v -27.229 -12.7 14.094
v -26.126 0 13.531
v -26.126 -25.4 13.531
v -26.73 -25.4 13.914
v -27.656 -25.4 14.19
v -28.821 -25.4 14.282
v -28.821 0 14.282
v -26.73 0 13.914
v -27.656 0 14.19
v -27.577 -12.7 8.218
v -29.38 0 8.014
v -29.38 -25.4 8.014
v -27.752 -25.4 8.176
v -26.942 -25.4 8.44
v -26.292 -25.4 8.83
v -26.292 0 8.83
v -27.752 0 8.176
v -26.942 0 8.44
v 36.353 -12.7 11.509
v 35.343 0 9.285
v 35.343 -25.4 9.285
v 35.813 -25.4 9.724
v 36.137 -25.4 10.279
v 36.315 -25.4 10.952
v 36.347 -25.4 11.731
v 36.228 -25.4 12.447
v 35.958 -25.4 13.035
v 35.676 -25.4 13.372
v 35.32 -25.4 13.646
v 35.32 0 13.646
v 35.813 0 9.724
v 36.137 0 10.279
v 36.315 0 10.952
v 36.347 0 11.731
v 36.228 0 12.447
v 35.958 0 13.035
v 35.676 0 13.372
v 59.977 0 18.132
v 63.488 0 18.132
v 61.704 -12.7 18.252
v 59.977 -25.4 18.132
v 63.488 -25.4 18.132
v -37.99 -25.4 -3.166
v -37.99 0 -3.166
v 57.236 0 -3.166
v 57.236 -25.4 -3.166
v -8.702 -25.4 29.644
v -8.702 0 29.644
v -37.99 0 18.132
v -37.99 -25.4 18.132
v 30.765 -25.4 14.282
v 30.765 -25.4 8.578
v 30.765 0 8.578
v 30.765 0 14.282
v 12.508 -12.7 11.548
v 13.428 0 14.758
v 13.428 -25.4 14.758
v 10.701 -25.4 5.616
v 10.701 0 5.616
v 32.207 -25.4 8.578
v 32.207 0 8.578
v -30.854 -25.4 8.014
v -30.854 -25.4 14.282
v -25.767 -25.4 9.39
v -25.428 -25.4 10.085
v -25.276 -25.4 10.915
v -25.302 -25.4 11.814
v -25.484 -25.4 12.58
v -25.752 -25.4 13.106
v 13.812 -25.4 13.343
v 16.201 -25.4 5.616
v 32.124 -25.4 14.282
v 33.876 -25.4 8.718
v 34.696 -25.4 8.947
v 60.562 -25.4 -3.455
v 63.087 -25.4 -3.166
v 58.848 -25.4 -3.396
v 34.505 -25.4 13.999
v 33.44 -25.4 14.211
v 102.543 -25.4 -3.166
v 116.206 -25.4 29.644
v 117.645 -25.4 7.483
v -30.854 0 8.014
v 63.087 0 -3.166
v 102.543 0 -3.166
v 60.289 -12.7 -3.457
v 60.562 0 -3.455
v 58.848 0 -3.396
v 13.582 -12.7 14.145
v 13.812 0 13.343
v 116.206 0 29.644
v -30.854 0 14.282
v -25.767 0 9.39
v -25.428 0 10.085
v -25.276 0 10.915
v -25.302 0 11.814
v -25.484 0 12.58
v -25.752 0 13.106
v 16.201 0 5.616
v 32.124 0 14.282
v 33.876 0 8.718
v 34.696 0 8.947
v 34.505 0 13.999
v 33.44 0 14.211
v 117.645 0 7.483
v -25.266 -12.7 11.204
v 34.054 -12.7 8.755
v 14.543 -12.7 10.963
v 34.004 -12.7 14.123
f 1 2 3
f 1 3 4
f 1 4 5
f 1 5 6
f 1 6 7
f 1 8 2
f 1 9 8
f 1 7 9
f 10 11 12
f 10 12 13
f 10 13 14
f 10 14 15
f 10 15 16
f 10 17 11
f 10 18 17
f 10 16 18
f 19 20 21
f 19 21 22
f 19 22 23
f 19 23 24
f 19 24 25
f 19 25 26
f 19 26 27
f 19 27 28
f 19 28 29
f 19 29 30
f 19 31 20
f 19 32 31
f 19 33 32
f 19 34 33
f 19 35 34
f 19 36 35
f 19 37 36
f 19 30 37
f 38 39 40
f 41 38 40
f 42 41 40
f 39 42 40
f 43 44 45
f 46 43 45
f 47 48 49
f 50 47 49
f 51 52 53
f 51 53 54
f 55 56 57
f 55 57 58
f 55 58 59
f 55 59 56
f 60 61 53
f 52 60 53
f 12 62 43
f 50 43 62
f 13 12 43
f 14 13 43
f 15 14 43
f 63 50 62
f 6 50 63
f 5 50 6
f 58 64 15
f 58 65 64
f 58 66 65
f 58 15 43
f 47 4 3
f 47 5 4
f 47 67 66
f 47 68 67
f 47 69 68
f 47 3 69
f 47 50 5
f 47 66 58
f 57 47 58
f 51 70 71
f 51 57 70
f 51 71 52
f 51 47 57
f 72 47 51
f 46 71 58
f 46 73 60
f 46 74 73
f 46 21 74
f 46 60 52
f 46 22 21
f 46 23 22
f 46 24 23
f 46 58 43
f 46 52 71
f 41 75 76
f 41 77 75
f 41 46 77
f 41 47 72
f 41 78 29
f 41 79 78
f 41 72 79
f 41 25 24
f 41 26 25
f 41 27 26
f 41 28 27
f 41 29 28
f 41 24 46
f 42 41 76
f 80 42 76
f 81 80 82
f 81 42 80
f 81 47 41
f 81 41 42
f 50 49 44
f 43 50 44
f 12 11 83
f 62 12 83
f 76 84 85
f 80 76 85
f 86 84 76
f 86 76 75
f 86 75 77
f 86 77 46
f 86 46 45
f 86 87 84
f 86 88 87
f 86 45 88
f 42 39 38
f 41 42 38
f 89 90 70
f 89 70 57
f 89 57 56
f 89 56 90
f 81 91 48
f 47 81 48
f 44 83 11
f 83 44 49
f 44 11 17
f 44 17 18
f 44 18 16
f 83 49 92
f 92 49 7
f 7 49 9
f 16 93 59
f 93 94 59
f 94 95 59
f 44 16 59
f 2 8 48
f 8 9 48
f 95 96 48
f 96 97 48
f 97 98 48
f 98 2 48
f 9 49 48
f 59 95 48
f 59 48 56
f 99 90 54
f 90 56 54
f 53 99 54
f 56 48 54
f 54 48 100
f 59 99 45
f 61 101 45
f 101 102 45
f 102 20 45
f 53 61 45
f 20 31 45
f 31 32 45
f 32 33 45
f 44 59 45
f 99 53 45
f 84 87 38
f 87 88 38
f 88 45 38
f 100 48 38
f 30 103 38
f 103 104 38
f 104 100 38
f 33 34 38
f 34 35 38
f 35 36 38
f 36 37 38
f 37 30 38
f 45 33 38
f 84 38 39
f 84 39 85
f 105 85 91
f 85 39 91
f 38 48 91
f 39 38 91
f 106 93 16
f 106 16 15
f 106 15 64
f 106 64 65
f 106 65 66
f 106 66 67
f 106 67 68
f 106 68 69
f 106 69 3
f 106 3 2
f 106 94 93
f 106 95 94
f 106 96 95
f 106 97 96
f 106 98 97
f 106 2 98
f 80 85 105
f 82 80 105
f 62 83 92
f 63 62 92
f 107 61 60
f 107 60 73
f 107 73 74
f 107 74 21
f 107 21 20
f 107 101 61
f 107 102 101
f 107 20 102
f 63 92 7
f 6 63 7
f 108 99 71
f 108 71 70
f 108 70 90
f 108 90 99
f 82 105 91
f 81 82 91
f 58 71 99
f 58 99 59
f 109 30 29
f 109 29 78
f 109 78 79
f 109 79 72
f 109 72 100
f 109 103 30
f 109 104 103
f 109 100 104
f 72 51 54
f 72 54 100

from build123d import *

# Parameters (mm, degrees)
F0_W     = 8.3609821595
F0_H     = 9.1143487112
F0_W_2   = 4.4786023839
F0_H_2   = 21.1173728506
F1_DEPTH = 25.4


with BuildPart() as f1:
    # F0 (on Front) → F1 (new body)
    with BuildSketch(Plane.XZ):
        with BuildLine():
            Line((-19.2826222628, 18.131762743), (-37.9903614521, 18.131762743))
            Line((-37.9903614521, 18.131762743), (-37.9903614521, -3.1658634543))
            Line((-37.9903614521, -3.1658634543), (-35.3327800581, -3.1658634543))
            Line((-35.3327800581, -3.1658634543), (-35.3327800581, 17.9515093963))
            Line((-35.3327800581, 17.9515093963), (-28.5894561384, 17.9515093963))
            add(Edge.make_bspline(
                [(-28.5894561384, 17.9515093963), (-24.7440514084, 17.9515093963), (-22.745088012, 16.296876111)],
                knots=[0, 0, 0, 1, 1, 1], degree=2))
            add(Edge.make_bspline(
                [(-22.745088012, 16.296876111), (-20.7461246157, 14.6422428257), (-20.7461246157, 11.3653294199)],
                knots=[0, 0, 0, 1, 1, 1], degree=2))
            add(Edge.make_bspline(
                [(-20.7461246157, 11.3653294199), (-20.7461246157, 7.9543814742), (-22.8768116115, 6.1495370667)],
                knots=[0, 0, 0, 1, 1, 1], degree=2))
            add(Edge.make_bspline(
                [(-22.8768116115, 6.1495370667), (-25.0074986074, 4.3446926591), (-28.9360971898, 4.3446926591)],
                knots=[0, 0, 0, 1, 1, 1], degree=2))
            Line((-28.9360971898, 4.3446926591), (-30.8541776742, 4.3446926591))
            Line((-30.8541776742, 4.3446926591), (-30.8541776742, -3.1658634543))
            Line((-30.8541776742, -3.1658634543), (-19.2826222628, -3.1658634543))
            Line((-19.2826222628, -3.1658634543), (-19.2826222628, 18.131762743))
        make_face()
        with BuildLine():
            Line((-8.7019680068, 29.6439938247), (-37.9903614521, 18.131762743))
            Line((-37.9903614521, 18.131762743), (-19.2826222628, 18.131762743))
            Line((-19.2826222628, 18.131762743), (2.0150034688, 18.131762743))
            Line((2.0150034688, 18.131762743), (24.7516594827, 18.131762743))
            Line((24.7516594827, 18.131762743), (44.3224497139, 18.131762743))
            Line((44.3224497139, 18.131762743), (52.0932041109, 18.131762743))
            Line((52.0932041109, 18.131762743), (59.9767177003, 18.131762743))
            add(Edge.make_bspline(
                [(59.9767177003, 18.131762743), (60.7857124915, 18.2519316408), (61.7036049274, 18.2519316408)],
                knots=[0.7260728655, 0.7260728655, 0.7260728655, 1, 1, 1], degree=2))
            add(Edge.make_bspline(
                [(61.7036049274, 18.2519316408), (62.6190151517, 18.2519316408), (63.4879314572, 18.131762743)],
                knots=[0, 0, 0, 0.5563486403, 0.5563486403, 0.5563486403], degree=2))
            Line((63.4879314572, 18.131762743), (69.9371621013, 18.131762743))
            Line((69.9371621013, 18.131762743), (86.3420888782, 18.131762743))
            Line((86.3420888782, 18.131762743), (102.5425426617, 18.131762743))
            Line((102.5425426617, 18.131762743), (116.2057295442, 29.6439938247))
            Line((116.2057295442, 29.6439938247), (84.2592939734, 29.6439938247))
            Line((84.2592939734, 29.6439938247), (-8.7019680068, 29.6439938247))
        make_face()
        Polygon((2.0150034688, 18.131762743), (-19.2826222628, 18.131762743), (-19.2826222628, -3.1658634543), (-16.7574415844, -3.1658634543), (-16.7574415844, 17.9515093963), (-12.2788392004, 17.9515093963), (-12.2788392004, 9.6737210891), (-3.9178570409, 9.6737210891), (-3.9178570409, 17.9515093963), (0.546879701, 17.9515093963), (0.546879701, -3.1658634543), (2.0150034688, -3.1658634543), align=None)
        with BuildLine():
            Line((-35.3327800581, 17.9515093963), (-35.3327800581, -3.1658634543))
            Line((-35.3327800581, -3.1658634543), (-30.8541776742, -3.1658634543))
            Line((-30.8541776742, -3.1658634543), (-30.8541776742, 4.3446926591))
            Line((-30.8541776742, 4.3446926591), (-28.9360971898, 4.3446926591))
            add(Edge.make_bspline(
                [(-22.8768116115, 6.1495370667), (-25.0074986074, 4.3446926591), (-28.9360971898, 4.3446926591)],
                knots=[0, 0, 0, 1, 1, 1], degree=2))
            add(Edge.make_bspline(
                [(-20.7461246157, 11.3653294199), (-20.7461246157, 7.9543814742), (-22.8768116115, 6.1495370667)],
                knots=[0, 0, 0, 1, 1, 1], degree=2))
            add(Edge.make_bspline(
                [(-22.745088012, 16.296876111), (-20.7461246157, 14.6422428257), (-20.7461246157, 11.3653294199)],
                knots=[0, 0, 0, 1, 1, 1], degree=2))
            add(Edge.make_bspline(
                [(-28.5894561384, 17.9515093963), (-24.7440514084, 17.9515093963), (-22.745088012, 16.296876111)],
                knots=[0, 0, 0, 1, 1, 1], degree=2))
            Line((-28.5894561384, 17.9515093963), (-35.3327800581, 17.9515093963))
        make_face()
        with BuildLine():
            Line((-29.3797977356, 8.0144659231), (-30.8541776742, 8.0144659231))
            Line((-30.8541776742, 8.0144659231), (-30.8541776742, 14.2817361322))
            Line((-30.8541776742, 14.2817361322), (-28.8205501727, 14.2817361322))
            add(Edge.make_bspline(
                [(-26.1259937332, 13.5306805209), (-26.9856635407, 14.2817361322), (-28.8205501727, 14.2817361322)],
                knots=[0, 0, 0, 1, 1, 1], degree=2))
            add(Edge.make_bspline(
                [(-25.2663239258, 11.2035635959), (-25.2663239258, 12.7796249096), (-26.1259937332, 13.5306805209)],
                knots=[0, 0, 0, 1, 1, 1], degree=2))
            add(Edge.make_bspline(
                [(-26.2923814379, 8.8302278641), (-25.2663239258, 9.645989805), (-25.2663239258, 11.2035635959)],
                knots=[0, 0, 0, 1, 1, 1], degree=2))
            add(Edge.make_bspline(
                [(-29.3797977356, 8.0144659231), (-27.31843895, 8.0144659231), (-26.2923814379, 8.8302278641)],
                knots=[0, 0, 0, 1, 1, 1], degree=2))
        make_face(mode=Mode.SUBTRACT)
        Polygon((24.7516594827, 18.131762743), (2.0150034688, 18.131762743), (2.0150034688, -3.1658634543), (3.218326737, -3.1658634543), (10.6734202822, 18.0393251293), (16.1457270135, 18.0393251293), (23.6285518428, -3.1658634543), (24.7516594827, -3.1658634543), align=None)
        Polygon((117.6447570324, 7.4829496443), (116.2057295442, 29.6439938247), (102.5425426617, 18.131762743), (102.5425426617, -3.1658634543), align=None)
        with BuildLine():
            Line((44.3224497139, 18.131762743), (24.7516594827, 18.131762743))
            Line((24.7516594827, 18.131762743), (24.7516594827, -3.1658634543))
            Line((24.7516594827, -3.1658634543), (26.2861332368, -3.1658634543))
            Line((26.2861332368, -3.1658634543), (26.2861332368, 17.9515093963))
            Line((26.2861332368, 17.9515093963), (32.4378564288, 17.9515093963))
            add(Edge.make_bspline(
                [(32.4378564288, 17.9515093963), (36.7454492274, 17.9515093963), (38.8091189533, 16.384691844)],
                knots=[0, 0, 0, 1, 1, 1], degree=2))
            add(Edge.make_bspline(
                [(38.8091189533, 16.384691844), (40.8727886792, 14.8178742917), (40.8727886792, 11.6241547383)],
                knots=[0, 0, 0, 1, 1, 1], degree=2))
            add(Edge.make_bspline(
                [(40.8727886792, 11.6241547383), (40.8727886792, 9.7615368221), (39.8490421075, 8.310266287)],
                knots=[0, 0, 0, 1, 1, 1], degree=2))
            add(Edge.make_bspline(
                [(39.8490421075, 8.310266287), (38.8252955357, 6.8589957518), (36.9441900968, 6.0363009899)],
                knots=[0, 0, 0, 1, 1, 1], degree=2))
            add(Edge.make_bspline(
                [(36.9441900968, 6.0363009899), (41.7139709639, -1.086017146), (43.1559977377, -3.1658634543)],
                knots=[0, 0, 0, 1, 1, 1], degree=2))
            Line((43.1559977377, -3.1658634543), (44.3224497139, -3.1658634543))
            Line((44.3224497139, -3.1658634543), (44.3224497139, 18.131762743))
        make_face()
        Polygon((-16.7574415844, 17.9515093963), (-16.7574415844, -3.1658634543), (-12.2788392004, -3.1658634543), (-12.2788392004, 5.9484852568), (-3.9178570409, 5.9484852568), (-3.9178570409, -3.1658634543), (0.546879701, -3.1658634543), (0.546879701, 17.9515093963), (-3.9178570409, 17.9515093963), (-3.9178570409, 9.6737210891), (-12.2788392004, 9.6737210891), (-12.2788392004, 17.9515093963), align=None)
        Polygon((102.5425426617, -3.1658634543), (102.5425426617, 18.131762743), (86.3420888782, 18.131762743), (86.3420888782, -3.1658634543), (88.4642940946, -3.1658634543), (88.4642940946, 17.9515093963), (100.6244621773, 17.9515093963), (100.6244621773, 14.2817361322), (92.9428964785, 14.2817361322), (92.9428964785, 9.645989805), (100.0929458985, 9.645989805), (100.0929458985, 5.976216541), (92.9428964785, 5.976216541), (92.9428964785, 0.5316410938), (100.6244621773, 0.5316410938), (100.6244621773, -3.1658634543), align=None)
        Polygon((52.0932041109, 18.131762743), (44.3224497139, 18.131762743), (44.3224497139, -3.1658634543), (45.8135791317, -3.1658634543), (45.8135791317, 17.9515093963), (50.2921815156, 17.9515093963), (50.2921815156, -3.1658634543), (52.0932041109, -3.1658634543), align=None)
        Polygon((10.6734202822, 18.0393251293), (3.218326737, -3.1658634543), (8.0435701724, -3.1658634543), (9.5734126791, 1.8627427311), (17.2734659007, 1.8627427311), (18.8033084075, -3.1658634543), (23.6285518428, -3.1658634543), (16.1457270135, 18.0393251293), align=None)
        with BuildLine():
            add(Edge.make_bspline(
                [(16.2011895817, 5.6157098475), (14.0797463472, 12.4468495002), (13.8116772675, 13.3434943531)],
                knots=[0, 0, 0, 1, 1, 1], degree=2))
            Line((16.2011895817, 5.6157098475), (10.7011515663, 5.6157098475))
            add(Edge.make_bspline(
                [(13.4280611706, 14.7577898428), (12.95200746, 12.9090375687), (10.7011515663, 5.6157098475)],
                knots=[0, 0, 0, 1, 1, 1], degree=2))
            add(Edge.make_bspline(
                [(13.8116772675, 13.3434943531), (13.5436081877, 14.2401392061), (13.4280611706, 14.7577898428)],
                knots=[0, 0, 0, 1, 1, 1], degree=2))
        make_face(mode=Mode.SUBTRACT)
        with Locations((-8.0983481207, 1.3913109013)):
            Rectangle(F0_W, F0_H)
        Polygon((86.3420888782, -3.1658634543), (86.3420888782, 18.131762743), (69.9371621013, 18.131762743), (69.9371621013, -3.1658634543), (71.8994737189, -3.1658634543), (71.8994737189, 17.9515093963), (84.0596418016, 17.9515093963), (84.0596418016, 14.2817361322), (76.3780761028, 14.2817361322), (76.3780761028, 9.645989805), (83.5281255228, 9.645989805), (83.5281255228, 5.976216541), (76.3780761028, 5.976216541), (76.3780761028, 0.5316410938), (84.0596418016, 0.5316410938), (84.0596418016, -3.1658634543), align=None)
        with BuildLine():
            Line((59.9767177003, 18.131762743), (52.0932041109, 18.131762743))
            Line((52.0932041109, 18.131762743), (52.0932041109, -3.1658634543))
            Line((52.0932041109, -3.1658634543), (57.2358830465, -3.1658634543))
            add(Edge.make_bspline(
                [(57.2358830465, -3.1658634543), (55.6650956404, -2.8475842694), (54.3085958311, -2.1814028684)],
                knots=[0.477766543, 0.477766543, 0.477766543, 1, 1, 1], degree=2))
            Line((54.3085958311, -2.1814028684), (54.3085958311, 1.9782897483))
            add(Edge.make_bspline(
                [(54.3085958311, 1.9782897483), (56.4439047076, 1.0215604464), (57.9252174672, 0.6333224689)],
                knots=[0, 0, 0, 1, 1, 1], degree=2))
            add(Edge.make_bspline(
                [(57.9252174672, 0.6333224689), (59.4065302268, 0.2450844913), (60.6359504891, 0.2450844913)],
                knots=[0, 0, 0, 1, 1, 1], degree=2))
            add(Edge.make_bspline(
                [(60.6359504891, 0.2450844913), (62.105708547, 0.2450844913), (62.8937392038, 0.8066429946)],
                knots=[0, 0, 0, 1, 1, 1], degree=2))
            add(Edge.make_bspline(
                [(62.8937392038, 0.8066429946), (63.6817698606, 1.3682014978), (63.6817698606, 2.482074743)],
                knots=[0, 0, 0, 1, 1, 1], degree=2))
            add(Edge.make_bspline(
                [(63.6817698606, 2.482074743), (63.6817698606, 3.1014067548), (63.3351288092, 3.5867042267)],
                knots=[0, 0, 0, 1, 1, 1], degree=2))
            add(Edge.make_bspline(
                [(63.3351288092, 3.5867042267), (62.9884877578, 4.0720016987), (62.3160041182, 4.5180131848)],
                knots=[0, 0, 0, 1, 1, 1], degree=2))
            add(Edge.make_bspline(
                [(62.3160041182, 4.5180131848), (61.6435204785, 4.9640246709), (59.5775398122, 5.9484852568)],
                knots=[0, 0, 0, 1, 1, 1], degree=2))
            add(Edge.make_bspline(
                [(59.5775398122, 5.9484852568), (57.6455936858, 6.8589957518), (56.6773096822, 7.6955561558)],
                knots=[0, 0, 0, 1, 1, 1], degree=2))
            add(Edge.make_bspline(
                [(56.6773096822, 7.6955561558), (55.7090256787, 8.5321165599), (55.131290593, 9.645989805)],
                knots=[0, 0, 0, 1, 1, 1], degree=2))
            add(Edge.make_bspline(
                [(55.131290593, 9.645989805), (54.5535555074, 10.7598630501), (54.5535555074, 12.2434867501)],
                knots=[0, 0, 0, 1, 1, 1], degree=2))
            add(Edge.make_bspline(
                [(54.5535555074, 12.2434867501), (54.5535555074, 15.048968326), (56.453148469, 16.6504499834)],
                knots=[0, 0, 0, 1, 1, 1], degree=2))
            add(Edge.make_bspline(
                [(56.453148469, 16.6504499834), (57.8323913738, 17.8132423594), (59.9767177003, 18.131762743)],
                knots=[0, 0, 0, 0.7260728655, 0.7260728655, 0.7260728655], degree=2))
        make_face()
        with BuildLine():
            Line((26.2861332368, 17.9515093963), (26.2861332368, -3.1658634543))
            Line((26.2861332368, -3.1658634543), (30.7647356207, -3.1658634543))
            Line((30.7647356207, -3.1658634543), (30.7647356207, 4.9362933868))
            Line((30.7647356207, 4.9362933868), (33.1450041736, 4.9362933868))
            Line((33.1450041736, 4.9362933868), (38.1874760011, -3.1658634543))
            Line((38.1874760011, -3.1658634543), (43.1559977377, -3.1658634543))
            add(Edge.make_bspline(
                [(36.9441900968, 6.0363009899), (41.7139709639, -1.086017146), (43.1559977377, -3.1658634543)],
                knots=[0, 0, 0, 1, 1, 1], degree=2))
            add(Edge.make_bspline(
                [(39.8490421075, 8.310266287), (38.8252955357, 6.8589957518), (36.9441900968, 6.0363009899)],
                knots=[0, 0, 0, 1, 1, 1], degree=2))
            add(Edge.make_bspline(
                [(40.8727886792, 11.6241547383), (40.8727886792, 9.7615368221), (39.8490421075, 8.310266287)],
                knots=[0, 0, 0, 1, 1, 1], degree=2))
            add(Edge.make_bspline(
                [(38.8091189533, 16.384691844), (40.8727886792, 14.8178742917), (40.8727886792, 11.6241547383)],
                knots=[0, 0, 0, 1, 1, 1], degree=2))
            add(Edge.make_bspline(
                [(32.4378564288, 17.9515093963), (36.7454492274, 17.9515093963), (38.8091189533, 16.384691844)],
                knots=[0, 0, 0, 1, 1, 1], degree=2))
            Line((32.4378564288, 17.9515093963), (26.2861332368, 17.9515093963))
        make_face()
        with BuildLine():
            Line((32.2067623945, 8.5783353667), (30.7647356207, 8.5783353667))
            Line((30.7647356207, 8.5783353667), (30.7647356207, 14.2817361322))
            Line((30.7647356207, 14.2817361322), (32.1235685422, 14.2817361322))
            add(Edge.make_bspline(
                [(35.319599036, 13.646227538), (34.2866087028, 14.2817361322), (32.1235685422, 14.2817361322)],
                knots=[0, 0, 0, 1, 1, 1], degree=2))
            add(Edge.make_bspline(
                [(36.3525893691, 11.5086077211), (36.3525893691, 13.0107189438), (35.319599036, 13.646227538)],
                knots=[0, 0, 0, 1, 1, 1], degree=2))
            add(Edge.make_bspline(
                [(35.3427084394, 9.2854831115), (36.3525893691, 9.9926308564), (36.3525893691, 11.5086077211)],
                knots=[0, 0, 0, 1, 1, 1], degree=2))
            add(Edge.make_bspline(
                [(32.2067623945, 8.5783353667), (34.3328275097, 8.5783353667), (35.3427084394, 9.2854831115)],
                knots=[0, 0, 0, 1, 1, 1], degree=2))
        make_face(mode=Mode.SUBTRACT)
        Polygon((9.5734126791, 1.8627427311), (8.0435701724, -3.1658634543), (18.8033084075, -3.1658634543), (17.2734659007, 1.8627427311), align=None)
        Polygon((88.4642940946, -3.1658634543), (100.6244621773, -3.1658634543), (100.6244621773, 0.5316410938), (92.9428964785, 0.5316410938), (92.9428964785, 5.976216541), (100.0929458985, 5.976216541), (100.0929458985, 9.645989805), (92.9428964785, 9.645989805), (92.9428964785, 14.2817361322), (100.6244621773, 14.2817361322), (100.6244621773, 17.9515093963), (88.4642940946, 17.9515093963), align=None)
        with BuildLine():
            Line((69.9371621013, -3.1658634543), (69.9371621013, 18.131762743))
            Line((69.9371621013, 18.131762743), (63.4879314572, 18.131762743))
            add(Edge.make_bspline(
                [(63.4879314572, 18.131762743), (64.180834922, 18.0359359699), (64.8441728529, 17.8636936633)],
                knots=[0.5563486403, 0.5563486403, 0.5563486403, 1, 1, 1], degree=2))
            add(Edge.make_bspline(
                [(64.8441728529, 17.8636936633), (66.3393512546, 17.4754556857), (67.9708751365, 16.7683079409)],
                knots=[0, 0, 0, 1, 1, 1], degree=2))
            Line((67.9708751365, 16.7683079409), (66.5288483627, 13.2834099042))
            add(Edge.make_bspline(
                [(66.5288483627, 13.2834099042), (64.8372400319, 13.976692007), (63.7326105482, 14.2516939078)],
                knots=[0, 0, 0, 1, 1, 1], degree=2))
            add(Edge.make_bspline(
                [(63.7326105482, 14.2516939078), (62.6279810644, 14.5266958086), (61.5603266261, 14.5266958086)],
                knots=[0, 0, 0, 1, 1, 1], degree=2))
            add(Edge.make_bspline(
                [(61.5603266261, 14.5266958086), (60.2893094377, 14.5266958086), (59.609892977, 13.9350950808)],
                knots=[0, 0, 0, 1, 1, 1], degree=2))
            add(Edge.make_bspline(
                [(59.609892977, 13.9350950808), (58.9304765163, 13.3434943531), (58.9304765163, 12.391386932)],
                knots=[0, 0, 0, 1, 1, 1], degree=2))
            add(Edge.make_bspline(
                [(58.9304765163, 12.391386932), (58.9304765163, 11.7997862043), (59.205478417, 11.3583965989)],
                knots=[0, 0, 0, 1, 1, 1], degree=2))
            add(Edge.make_bspline(
                [(59.205478417, 11.3583965989), (59.4804803178, 10.9170069934), (60.0790138665, 10.5056596124)],
                knots=[0, 0, 0, 1, 1, 1], degree=2))
            add(Edge.make_bspline(
                [(60.0790138665, 10.5056596124), (60.6775474153, 10.0943122315), (62.9145376669, 9.0266577932)],
                knots=[0, 0, 0, 1, 1, 1], degree=2))
            add(Edge.make_bspline(
                [(62.9145376669, 9.0266577932), (65.8771631861, 7.6077404228), (66.9748598488, 6.1865121121)],
                knots=[0, 0, 0, 1, 1, 1], degree=2))
            add(Edge.make_bspline(
                [(66.9748598488, 6.1865121121), (68.0725565116, 4.7652838014), (68.0725565116, 2.6993031352)],
                knots=[0, 0, 0, 1, 1, 1], degree=2))
            add(Edge.make_bspline(
                [(68.0725565116, 2.6993031352), (68.0725565116, -0.161641009), (66.0135086663, -1.8093414732)],
                knots=[0, 0, 0, 1, 1, 1], degree=2))
            add(Edge.make_bspline(
                [(66.0135086663, -1.8093414732), (64.8200402885, -2.7643840697), (63.0869836467, -3.1658634543)],
                knots=[0, 0, 0, 0.5796214889, 0.5796214889, 0.5796214889], degree=2))
            Line((63.0869836467, -3.1658634543), (69.9371621013, -3.1658634543))
        make_face()
        with BuildLine():
            Line((63.4879314572, 18.131762743), (59.9767177003, 18.131762743))
            add(Edge.make_bspline(
                [(56.453148469, 16.6504499834), (57.8323913738, 17.8132423594), (59.9767177003, 18.131762743)],
                knots=[0, 0, 0, 0.7260728655, 0.7260728655, 0.7260728655], degree=2))
            add(Edge.make_bspline(
                [(54.5535555074, 12.2434867501), (54.5535555074, 15.048968326), (56.453148469, 16.6504499834)],
                knots=[0, 0, 0, 1, 1, 1], degree=2))
            add(Edge.make_bspline(
                [(55.131290593, 9.645989805), (54.5535555074, 10.7598630501), (54.5535555074, 12.2434867501)],
                knots=[0, 0, 0, 1, 1, 1], degree=2))
            add(Edge.make_bspline(
                [(56.6773096822, 7.6955561558), (55.7090256787, 8.5321165599), (55.131290593, 9.645989805)],
                knots=[0, 0, 0, 1, 1, 1], degree=2))
            add(Edge.make_bspline(
                [(59.5775398122, 5.9484852568), (57.6455936858, 6.8589957518), (56.6773096822, 7.6955561558)],
                knots=[0, 0, 0, 1, 1, 1], degree=2))
            add(Edge.make_bspline(
                [(62.3160041182, 4.5180131848), (61.6435204785, 4.9640246709), (59.5775398122, 5.9484852568)],
                knots=[0, 0, 0, 1, 1, 1], degree=2))
            add(Edge.make_bspline(
                [(63.3351288092, 3.5867042267), (62.9884877578, 4.0720016987), (62.3160041182, 4.5180131848)],
                knots=[0, 0, 0, 1, 1, 1], degree=2))
            add(Edge.make_bspline(
                [(63.6817698606, 2.482074743), (63.6817698606, 3.1014067548), (63.3351288092, 3.5867042267)],
                knots=[0, 0, 0, 1, 1, 1], degree=2))
            add(Edge.make_bspline(
                [(62.8937392038, 0.8066429946), (63.6817698606, 1.3682014978), (63.6817698606, 2.482074743)],
                knots=[0, 0, 0, 1, 1, 1], degree=2))
            add(Edge.make_bspline(
                [(60.6359504891, 0.2450844913), (62.105708547, 0.2450844913), (62.8937392038, 0.8066429946)],
                knots=[0, 0, 0, 1, 1, 1], degree=2))
            add(Edge.make_bspline(
                [(57.9252174672, 0.6333224689), (59.4065302268, 0.2450844913), (60.6359504891, 0.2450844913)],
                knots=[0, 0, 0, 1, 1, 1], degree=2))
            add(Edge.make_bspline(
                [(54.3085958311, 1.9782897483), (56.4439047076, 1.0215604464), (57.9252174672, 0.6333224689)],
                knots=[0, 0, 0, 1, 1, 1], degree=2))
            Line((54.3085958311, 1.9782897483), (54.3085958311, -2.1814028684))
            add(Edge.make_bspline(
                [(57.2358830465, -3.1658634543), (55.6650956404, -2.8475842694), (54.3085958311, -2.1814028684)],
                knots=[0.477766543, 0.477766543, 0.477766543, 1, 1, 1], degree=2))
            Line((57.2358830465, -3.1658634543), (63.0869836467, -3.1658634543))
            add(Edge.make_bspline(
                [(66.0135086663, -1.8093414732), (64.8200402885, -2.7643840697), (63.0869836467, -3.1658634543)],
                knots=[0, 0, 0, 0.5796214889, 0.5796214889, 0.5796214889], degree=2))
            add(Edge.make_bspline(
                [(68.0725565116, 2.6993031352), (68.0725565116, -0.161641009), (66.0135086663, -1.8093414732)],
                knots=[0, 0, 0, 1, 1, 1], degree=2))
            add(Edge.make_bspline(
                [(66.9748598488, 6.1865121121), (68.0725565116, 4.7652838014), (68.0725565116, 2.6993031352)],
                knots=[0, 0, 0, 1, 1, 1], degree=2))
            add(Edge.make_bspline(
                [(62.9145376669, 9.0266577932), (65.8771631861, 7.6077404228), (66.9748598488, 6.1865121121)],
                knots=[0, 0, 0, 1, 1, 1], degree=2))
            add(Edge.make_bspline(
                [(60.0790138665, 10.5056596124), (60.6775474153, 10.0943122315), (62.9145376669, 9.0266577932)],
                knots=[0, 0, 0, 1, 1, 1], degree=2))
            add(Edge.make_bspline(
                [(59.205478417, 11.3583965989), (59.4804803178, 10.9170069934), (60.0790138665, 10.5056596124)],
                knots=[0, 0, 0, 1, 1, 1], degree=2))
            add(Edge.make_bspline(
                [(58.9304765163, 12.391386932), (58.9304765163, 11.7997862043), (59.205478417, 11.3583965989)],
                knots=[0, 0, 0, 1, 1, 1], degree=2))
            add(Edge.make_bspline(
                [(59.609892977, 13.9350950808), (58.9304765163, 13.3434943531), (58.9304765163, 12.391386932)],
                knots=[0, 0, 0, 1, 1, 1], degree=2))
            add(Edge.make_bspline(
                [(61.5603266261, 14.5266958086), (60.2893094377, 14.5266958086), (59.609892977, 13.9350950808)],
                knots=[0, 0, 0, 1, 1, 1], degree=2))
            add(Edge.make_bspline(
                [(63.7326105482, 14.2516939078), (62.6279810644, 14.5266958086), (61.5603266261, 14.5266958086)],
                knots=[0, 0, 0, 1, 1, 1], degree=2))
            add(Edge.make_bspline(
                [(66.5288483627, 13.2834099042), (64.8372400319, 13.976692007), (63.7326105482, 14.2516939078)],
                knots=[0, 0, 0, 1, 1, 1], degree=2))
            Line((66.5288483627, 13.2834099042), (67.9708751365, 16.7683079409))
            add(Edge.make_bspline(
                [(64.8441728529, 17.8636936633), (66.3393512546, 17.4754556857), (67.9708751365, 16.7683079409)],
                knots=[0, 0, 0, 1, 1, 1], degree=2))
            add(Edge.make_bspline(
                [(63.4879314572, 18.131762743), (64.180834922, 18.0359359699), (64.8441728529, 17.8636936633)],
                knots=[0.5563486403, 0.5563486403, 0.5563486403, 1, 1, 1], degree=2))
        make_face()
        with Locations((48.0528803237, 7.392822971)):
            Rectangle(F0_W_2, F0_H_2)
        Polygon((30.7647356207, 4.9362933868), (30.7647356207, -3.1658634543), (38.1874760011, -3.1658634543), (33.1450041736, 4.9362933868), align=None)
        Polygon((71.8994737189, -3.1658634543), (84.0596418016, -3.1658634543), (84.0596418016, 0.5316410938), (76.3780761028, 0.5316410938), (76.3780761028, 5.976216541), (83.5281255228, 5.976216541), (83.5281255228, 9.645989805), (76.3780761028, 9.645989805), (76.3780761028, 14.2817361322), (84.0596418016, 14.2817361322), (84.0596418016, 17.9515093963), (71.8994737189, 17.9515093963), align=None)
        with BuildLine():
            Line((63.0869836467, -3.1658634543), (57.2358830465, -3.1658634543))
            add(Edge.make_bspline(
                [(60.2893094377, -3.4570419375), (58.6729217092, -3.4570419375), (57.2358830465, -3.1658634543)],
                knots=[0, 0, 0, 0.477766543, 0.477766543, 0.477766543], degree=2))
            add(Edge.make_bspline(
                [(63.0869836467, -3.1658634543), (61.8300603191, -3.4570419375), (60.2893094377, -3.4570419375)],
                knots=[0.5796214889, 0.5796214889, 0.5796214889, 1, 1, 1], degree=2))
        make_face()
    extrude(amount=F1_DEPTH)


solid = f1.part
